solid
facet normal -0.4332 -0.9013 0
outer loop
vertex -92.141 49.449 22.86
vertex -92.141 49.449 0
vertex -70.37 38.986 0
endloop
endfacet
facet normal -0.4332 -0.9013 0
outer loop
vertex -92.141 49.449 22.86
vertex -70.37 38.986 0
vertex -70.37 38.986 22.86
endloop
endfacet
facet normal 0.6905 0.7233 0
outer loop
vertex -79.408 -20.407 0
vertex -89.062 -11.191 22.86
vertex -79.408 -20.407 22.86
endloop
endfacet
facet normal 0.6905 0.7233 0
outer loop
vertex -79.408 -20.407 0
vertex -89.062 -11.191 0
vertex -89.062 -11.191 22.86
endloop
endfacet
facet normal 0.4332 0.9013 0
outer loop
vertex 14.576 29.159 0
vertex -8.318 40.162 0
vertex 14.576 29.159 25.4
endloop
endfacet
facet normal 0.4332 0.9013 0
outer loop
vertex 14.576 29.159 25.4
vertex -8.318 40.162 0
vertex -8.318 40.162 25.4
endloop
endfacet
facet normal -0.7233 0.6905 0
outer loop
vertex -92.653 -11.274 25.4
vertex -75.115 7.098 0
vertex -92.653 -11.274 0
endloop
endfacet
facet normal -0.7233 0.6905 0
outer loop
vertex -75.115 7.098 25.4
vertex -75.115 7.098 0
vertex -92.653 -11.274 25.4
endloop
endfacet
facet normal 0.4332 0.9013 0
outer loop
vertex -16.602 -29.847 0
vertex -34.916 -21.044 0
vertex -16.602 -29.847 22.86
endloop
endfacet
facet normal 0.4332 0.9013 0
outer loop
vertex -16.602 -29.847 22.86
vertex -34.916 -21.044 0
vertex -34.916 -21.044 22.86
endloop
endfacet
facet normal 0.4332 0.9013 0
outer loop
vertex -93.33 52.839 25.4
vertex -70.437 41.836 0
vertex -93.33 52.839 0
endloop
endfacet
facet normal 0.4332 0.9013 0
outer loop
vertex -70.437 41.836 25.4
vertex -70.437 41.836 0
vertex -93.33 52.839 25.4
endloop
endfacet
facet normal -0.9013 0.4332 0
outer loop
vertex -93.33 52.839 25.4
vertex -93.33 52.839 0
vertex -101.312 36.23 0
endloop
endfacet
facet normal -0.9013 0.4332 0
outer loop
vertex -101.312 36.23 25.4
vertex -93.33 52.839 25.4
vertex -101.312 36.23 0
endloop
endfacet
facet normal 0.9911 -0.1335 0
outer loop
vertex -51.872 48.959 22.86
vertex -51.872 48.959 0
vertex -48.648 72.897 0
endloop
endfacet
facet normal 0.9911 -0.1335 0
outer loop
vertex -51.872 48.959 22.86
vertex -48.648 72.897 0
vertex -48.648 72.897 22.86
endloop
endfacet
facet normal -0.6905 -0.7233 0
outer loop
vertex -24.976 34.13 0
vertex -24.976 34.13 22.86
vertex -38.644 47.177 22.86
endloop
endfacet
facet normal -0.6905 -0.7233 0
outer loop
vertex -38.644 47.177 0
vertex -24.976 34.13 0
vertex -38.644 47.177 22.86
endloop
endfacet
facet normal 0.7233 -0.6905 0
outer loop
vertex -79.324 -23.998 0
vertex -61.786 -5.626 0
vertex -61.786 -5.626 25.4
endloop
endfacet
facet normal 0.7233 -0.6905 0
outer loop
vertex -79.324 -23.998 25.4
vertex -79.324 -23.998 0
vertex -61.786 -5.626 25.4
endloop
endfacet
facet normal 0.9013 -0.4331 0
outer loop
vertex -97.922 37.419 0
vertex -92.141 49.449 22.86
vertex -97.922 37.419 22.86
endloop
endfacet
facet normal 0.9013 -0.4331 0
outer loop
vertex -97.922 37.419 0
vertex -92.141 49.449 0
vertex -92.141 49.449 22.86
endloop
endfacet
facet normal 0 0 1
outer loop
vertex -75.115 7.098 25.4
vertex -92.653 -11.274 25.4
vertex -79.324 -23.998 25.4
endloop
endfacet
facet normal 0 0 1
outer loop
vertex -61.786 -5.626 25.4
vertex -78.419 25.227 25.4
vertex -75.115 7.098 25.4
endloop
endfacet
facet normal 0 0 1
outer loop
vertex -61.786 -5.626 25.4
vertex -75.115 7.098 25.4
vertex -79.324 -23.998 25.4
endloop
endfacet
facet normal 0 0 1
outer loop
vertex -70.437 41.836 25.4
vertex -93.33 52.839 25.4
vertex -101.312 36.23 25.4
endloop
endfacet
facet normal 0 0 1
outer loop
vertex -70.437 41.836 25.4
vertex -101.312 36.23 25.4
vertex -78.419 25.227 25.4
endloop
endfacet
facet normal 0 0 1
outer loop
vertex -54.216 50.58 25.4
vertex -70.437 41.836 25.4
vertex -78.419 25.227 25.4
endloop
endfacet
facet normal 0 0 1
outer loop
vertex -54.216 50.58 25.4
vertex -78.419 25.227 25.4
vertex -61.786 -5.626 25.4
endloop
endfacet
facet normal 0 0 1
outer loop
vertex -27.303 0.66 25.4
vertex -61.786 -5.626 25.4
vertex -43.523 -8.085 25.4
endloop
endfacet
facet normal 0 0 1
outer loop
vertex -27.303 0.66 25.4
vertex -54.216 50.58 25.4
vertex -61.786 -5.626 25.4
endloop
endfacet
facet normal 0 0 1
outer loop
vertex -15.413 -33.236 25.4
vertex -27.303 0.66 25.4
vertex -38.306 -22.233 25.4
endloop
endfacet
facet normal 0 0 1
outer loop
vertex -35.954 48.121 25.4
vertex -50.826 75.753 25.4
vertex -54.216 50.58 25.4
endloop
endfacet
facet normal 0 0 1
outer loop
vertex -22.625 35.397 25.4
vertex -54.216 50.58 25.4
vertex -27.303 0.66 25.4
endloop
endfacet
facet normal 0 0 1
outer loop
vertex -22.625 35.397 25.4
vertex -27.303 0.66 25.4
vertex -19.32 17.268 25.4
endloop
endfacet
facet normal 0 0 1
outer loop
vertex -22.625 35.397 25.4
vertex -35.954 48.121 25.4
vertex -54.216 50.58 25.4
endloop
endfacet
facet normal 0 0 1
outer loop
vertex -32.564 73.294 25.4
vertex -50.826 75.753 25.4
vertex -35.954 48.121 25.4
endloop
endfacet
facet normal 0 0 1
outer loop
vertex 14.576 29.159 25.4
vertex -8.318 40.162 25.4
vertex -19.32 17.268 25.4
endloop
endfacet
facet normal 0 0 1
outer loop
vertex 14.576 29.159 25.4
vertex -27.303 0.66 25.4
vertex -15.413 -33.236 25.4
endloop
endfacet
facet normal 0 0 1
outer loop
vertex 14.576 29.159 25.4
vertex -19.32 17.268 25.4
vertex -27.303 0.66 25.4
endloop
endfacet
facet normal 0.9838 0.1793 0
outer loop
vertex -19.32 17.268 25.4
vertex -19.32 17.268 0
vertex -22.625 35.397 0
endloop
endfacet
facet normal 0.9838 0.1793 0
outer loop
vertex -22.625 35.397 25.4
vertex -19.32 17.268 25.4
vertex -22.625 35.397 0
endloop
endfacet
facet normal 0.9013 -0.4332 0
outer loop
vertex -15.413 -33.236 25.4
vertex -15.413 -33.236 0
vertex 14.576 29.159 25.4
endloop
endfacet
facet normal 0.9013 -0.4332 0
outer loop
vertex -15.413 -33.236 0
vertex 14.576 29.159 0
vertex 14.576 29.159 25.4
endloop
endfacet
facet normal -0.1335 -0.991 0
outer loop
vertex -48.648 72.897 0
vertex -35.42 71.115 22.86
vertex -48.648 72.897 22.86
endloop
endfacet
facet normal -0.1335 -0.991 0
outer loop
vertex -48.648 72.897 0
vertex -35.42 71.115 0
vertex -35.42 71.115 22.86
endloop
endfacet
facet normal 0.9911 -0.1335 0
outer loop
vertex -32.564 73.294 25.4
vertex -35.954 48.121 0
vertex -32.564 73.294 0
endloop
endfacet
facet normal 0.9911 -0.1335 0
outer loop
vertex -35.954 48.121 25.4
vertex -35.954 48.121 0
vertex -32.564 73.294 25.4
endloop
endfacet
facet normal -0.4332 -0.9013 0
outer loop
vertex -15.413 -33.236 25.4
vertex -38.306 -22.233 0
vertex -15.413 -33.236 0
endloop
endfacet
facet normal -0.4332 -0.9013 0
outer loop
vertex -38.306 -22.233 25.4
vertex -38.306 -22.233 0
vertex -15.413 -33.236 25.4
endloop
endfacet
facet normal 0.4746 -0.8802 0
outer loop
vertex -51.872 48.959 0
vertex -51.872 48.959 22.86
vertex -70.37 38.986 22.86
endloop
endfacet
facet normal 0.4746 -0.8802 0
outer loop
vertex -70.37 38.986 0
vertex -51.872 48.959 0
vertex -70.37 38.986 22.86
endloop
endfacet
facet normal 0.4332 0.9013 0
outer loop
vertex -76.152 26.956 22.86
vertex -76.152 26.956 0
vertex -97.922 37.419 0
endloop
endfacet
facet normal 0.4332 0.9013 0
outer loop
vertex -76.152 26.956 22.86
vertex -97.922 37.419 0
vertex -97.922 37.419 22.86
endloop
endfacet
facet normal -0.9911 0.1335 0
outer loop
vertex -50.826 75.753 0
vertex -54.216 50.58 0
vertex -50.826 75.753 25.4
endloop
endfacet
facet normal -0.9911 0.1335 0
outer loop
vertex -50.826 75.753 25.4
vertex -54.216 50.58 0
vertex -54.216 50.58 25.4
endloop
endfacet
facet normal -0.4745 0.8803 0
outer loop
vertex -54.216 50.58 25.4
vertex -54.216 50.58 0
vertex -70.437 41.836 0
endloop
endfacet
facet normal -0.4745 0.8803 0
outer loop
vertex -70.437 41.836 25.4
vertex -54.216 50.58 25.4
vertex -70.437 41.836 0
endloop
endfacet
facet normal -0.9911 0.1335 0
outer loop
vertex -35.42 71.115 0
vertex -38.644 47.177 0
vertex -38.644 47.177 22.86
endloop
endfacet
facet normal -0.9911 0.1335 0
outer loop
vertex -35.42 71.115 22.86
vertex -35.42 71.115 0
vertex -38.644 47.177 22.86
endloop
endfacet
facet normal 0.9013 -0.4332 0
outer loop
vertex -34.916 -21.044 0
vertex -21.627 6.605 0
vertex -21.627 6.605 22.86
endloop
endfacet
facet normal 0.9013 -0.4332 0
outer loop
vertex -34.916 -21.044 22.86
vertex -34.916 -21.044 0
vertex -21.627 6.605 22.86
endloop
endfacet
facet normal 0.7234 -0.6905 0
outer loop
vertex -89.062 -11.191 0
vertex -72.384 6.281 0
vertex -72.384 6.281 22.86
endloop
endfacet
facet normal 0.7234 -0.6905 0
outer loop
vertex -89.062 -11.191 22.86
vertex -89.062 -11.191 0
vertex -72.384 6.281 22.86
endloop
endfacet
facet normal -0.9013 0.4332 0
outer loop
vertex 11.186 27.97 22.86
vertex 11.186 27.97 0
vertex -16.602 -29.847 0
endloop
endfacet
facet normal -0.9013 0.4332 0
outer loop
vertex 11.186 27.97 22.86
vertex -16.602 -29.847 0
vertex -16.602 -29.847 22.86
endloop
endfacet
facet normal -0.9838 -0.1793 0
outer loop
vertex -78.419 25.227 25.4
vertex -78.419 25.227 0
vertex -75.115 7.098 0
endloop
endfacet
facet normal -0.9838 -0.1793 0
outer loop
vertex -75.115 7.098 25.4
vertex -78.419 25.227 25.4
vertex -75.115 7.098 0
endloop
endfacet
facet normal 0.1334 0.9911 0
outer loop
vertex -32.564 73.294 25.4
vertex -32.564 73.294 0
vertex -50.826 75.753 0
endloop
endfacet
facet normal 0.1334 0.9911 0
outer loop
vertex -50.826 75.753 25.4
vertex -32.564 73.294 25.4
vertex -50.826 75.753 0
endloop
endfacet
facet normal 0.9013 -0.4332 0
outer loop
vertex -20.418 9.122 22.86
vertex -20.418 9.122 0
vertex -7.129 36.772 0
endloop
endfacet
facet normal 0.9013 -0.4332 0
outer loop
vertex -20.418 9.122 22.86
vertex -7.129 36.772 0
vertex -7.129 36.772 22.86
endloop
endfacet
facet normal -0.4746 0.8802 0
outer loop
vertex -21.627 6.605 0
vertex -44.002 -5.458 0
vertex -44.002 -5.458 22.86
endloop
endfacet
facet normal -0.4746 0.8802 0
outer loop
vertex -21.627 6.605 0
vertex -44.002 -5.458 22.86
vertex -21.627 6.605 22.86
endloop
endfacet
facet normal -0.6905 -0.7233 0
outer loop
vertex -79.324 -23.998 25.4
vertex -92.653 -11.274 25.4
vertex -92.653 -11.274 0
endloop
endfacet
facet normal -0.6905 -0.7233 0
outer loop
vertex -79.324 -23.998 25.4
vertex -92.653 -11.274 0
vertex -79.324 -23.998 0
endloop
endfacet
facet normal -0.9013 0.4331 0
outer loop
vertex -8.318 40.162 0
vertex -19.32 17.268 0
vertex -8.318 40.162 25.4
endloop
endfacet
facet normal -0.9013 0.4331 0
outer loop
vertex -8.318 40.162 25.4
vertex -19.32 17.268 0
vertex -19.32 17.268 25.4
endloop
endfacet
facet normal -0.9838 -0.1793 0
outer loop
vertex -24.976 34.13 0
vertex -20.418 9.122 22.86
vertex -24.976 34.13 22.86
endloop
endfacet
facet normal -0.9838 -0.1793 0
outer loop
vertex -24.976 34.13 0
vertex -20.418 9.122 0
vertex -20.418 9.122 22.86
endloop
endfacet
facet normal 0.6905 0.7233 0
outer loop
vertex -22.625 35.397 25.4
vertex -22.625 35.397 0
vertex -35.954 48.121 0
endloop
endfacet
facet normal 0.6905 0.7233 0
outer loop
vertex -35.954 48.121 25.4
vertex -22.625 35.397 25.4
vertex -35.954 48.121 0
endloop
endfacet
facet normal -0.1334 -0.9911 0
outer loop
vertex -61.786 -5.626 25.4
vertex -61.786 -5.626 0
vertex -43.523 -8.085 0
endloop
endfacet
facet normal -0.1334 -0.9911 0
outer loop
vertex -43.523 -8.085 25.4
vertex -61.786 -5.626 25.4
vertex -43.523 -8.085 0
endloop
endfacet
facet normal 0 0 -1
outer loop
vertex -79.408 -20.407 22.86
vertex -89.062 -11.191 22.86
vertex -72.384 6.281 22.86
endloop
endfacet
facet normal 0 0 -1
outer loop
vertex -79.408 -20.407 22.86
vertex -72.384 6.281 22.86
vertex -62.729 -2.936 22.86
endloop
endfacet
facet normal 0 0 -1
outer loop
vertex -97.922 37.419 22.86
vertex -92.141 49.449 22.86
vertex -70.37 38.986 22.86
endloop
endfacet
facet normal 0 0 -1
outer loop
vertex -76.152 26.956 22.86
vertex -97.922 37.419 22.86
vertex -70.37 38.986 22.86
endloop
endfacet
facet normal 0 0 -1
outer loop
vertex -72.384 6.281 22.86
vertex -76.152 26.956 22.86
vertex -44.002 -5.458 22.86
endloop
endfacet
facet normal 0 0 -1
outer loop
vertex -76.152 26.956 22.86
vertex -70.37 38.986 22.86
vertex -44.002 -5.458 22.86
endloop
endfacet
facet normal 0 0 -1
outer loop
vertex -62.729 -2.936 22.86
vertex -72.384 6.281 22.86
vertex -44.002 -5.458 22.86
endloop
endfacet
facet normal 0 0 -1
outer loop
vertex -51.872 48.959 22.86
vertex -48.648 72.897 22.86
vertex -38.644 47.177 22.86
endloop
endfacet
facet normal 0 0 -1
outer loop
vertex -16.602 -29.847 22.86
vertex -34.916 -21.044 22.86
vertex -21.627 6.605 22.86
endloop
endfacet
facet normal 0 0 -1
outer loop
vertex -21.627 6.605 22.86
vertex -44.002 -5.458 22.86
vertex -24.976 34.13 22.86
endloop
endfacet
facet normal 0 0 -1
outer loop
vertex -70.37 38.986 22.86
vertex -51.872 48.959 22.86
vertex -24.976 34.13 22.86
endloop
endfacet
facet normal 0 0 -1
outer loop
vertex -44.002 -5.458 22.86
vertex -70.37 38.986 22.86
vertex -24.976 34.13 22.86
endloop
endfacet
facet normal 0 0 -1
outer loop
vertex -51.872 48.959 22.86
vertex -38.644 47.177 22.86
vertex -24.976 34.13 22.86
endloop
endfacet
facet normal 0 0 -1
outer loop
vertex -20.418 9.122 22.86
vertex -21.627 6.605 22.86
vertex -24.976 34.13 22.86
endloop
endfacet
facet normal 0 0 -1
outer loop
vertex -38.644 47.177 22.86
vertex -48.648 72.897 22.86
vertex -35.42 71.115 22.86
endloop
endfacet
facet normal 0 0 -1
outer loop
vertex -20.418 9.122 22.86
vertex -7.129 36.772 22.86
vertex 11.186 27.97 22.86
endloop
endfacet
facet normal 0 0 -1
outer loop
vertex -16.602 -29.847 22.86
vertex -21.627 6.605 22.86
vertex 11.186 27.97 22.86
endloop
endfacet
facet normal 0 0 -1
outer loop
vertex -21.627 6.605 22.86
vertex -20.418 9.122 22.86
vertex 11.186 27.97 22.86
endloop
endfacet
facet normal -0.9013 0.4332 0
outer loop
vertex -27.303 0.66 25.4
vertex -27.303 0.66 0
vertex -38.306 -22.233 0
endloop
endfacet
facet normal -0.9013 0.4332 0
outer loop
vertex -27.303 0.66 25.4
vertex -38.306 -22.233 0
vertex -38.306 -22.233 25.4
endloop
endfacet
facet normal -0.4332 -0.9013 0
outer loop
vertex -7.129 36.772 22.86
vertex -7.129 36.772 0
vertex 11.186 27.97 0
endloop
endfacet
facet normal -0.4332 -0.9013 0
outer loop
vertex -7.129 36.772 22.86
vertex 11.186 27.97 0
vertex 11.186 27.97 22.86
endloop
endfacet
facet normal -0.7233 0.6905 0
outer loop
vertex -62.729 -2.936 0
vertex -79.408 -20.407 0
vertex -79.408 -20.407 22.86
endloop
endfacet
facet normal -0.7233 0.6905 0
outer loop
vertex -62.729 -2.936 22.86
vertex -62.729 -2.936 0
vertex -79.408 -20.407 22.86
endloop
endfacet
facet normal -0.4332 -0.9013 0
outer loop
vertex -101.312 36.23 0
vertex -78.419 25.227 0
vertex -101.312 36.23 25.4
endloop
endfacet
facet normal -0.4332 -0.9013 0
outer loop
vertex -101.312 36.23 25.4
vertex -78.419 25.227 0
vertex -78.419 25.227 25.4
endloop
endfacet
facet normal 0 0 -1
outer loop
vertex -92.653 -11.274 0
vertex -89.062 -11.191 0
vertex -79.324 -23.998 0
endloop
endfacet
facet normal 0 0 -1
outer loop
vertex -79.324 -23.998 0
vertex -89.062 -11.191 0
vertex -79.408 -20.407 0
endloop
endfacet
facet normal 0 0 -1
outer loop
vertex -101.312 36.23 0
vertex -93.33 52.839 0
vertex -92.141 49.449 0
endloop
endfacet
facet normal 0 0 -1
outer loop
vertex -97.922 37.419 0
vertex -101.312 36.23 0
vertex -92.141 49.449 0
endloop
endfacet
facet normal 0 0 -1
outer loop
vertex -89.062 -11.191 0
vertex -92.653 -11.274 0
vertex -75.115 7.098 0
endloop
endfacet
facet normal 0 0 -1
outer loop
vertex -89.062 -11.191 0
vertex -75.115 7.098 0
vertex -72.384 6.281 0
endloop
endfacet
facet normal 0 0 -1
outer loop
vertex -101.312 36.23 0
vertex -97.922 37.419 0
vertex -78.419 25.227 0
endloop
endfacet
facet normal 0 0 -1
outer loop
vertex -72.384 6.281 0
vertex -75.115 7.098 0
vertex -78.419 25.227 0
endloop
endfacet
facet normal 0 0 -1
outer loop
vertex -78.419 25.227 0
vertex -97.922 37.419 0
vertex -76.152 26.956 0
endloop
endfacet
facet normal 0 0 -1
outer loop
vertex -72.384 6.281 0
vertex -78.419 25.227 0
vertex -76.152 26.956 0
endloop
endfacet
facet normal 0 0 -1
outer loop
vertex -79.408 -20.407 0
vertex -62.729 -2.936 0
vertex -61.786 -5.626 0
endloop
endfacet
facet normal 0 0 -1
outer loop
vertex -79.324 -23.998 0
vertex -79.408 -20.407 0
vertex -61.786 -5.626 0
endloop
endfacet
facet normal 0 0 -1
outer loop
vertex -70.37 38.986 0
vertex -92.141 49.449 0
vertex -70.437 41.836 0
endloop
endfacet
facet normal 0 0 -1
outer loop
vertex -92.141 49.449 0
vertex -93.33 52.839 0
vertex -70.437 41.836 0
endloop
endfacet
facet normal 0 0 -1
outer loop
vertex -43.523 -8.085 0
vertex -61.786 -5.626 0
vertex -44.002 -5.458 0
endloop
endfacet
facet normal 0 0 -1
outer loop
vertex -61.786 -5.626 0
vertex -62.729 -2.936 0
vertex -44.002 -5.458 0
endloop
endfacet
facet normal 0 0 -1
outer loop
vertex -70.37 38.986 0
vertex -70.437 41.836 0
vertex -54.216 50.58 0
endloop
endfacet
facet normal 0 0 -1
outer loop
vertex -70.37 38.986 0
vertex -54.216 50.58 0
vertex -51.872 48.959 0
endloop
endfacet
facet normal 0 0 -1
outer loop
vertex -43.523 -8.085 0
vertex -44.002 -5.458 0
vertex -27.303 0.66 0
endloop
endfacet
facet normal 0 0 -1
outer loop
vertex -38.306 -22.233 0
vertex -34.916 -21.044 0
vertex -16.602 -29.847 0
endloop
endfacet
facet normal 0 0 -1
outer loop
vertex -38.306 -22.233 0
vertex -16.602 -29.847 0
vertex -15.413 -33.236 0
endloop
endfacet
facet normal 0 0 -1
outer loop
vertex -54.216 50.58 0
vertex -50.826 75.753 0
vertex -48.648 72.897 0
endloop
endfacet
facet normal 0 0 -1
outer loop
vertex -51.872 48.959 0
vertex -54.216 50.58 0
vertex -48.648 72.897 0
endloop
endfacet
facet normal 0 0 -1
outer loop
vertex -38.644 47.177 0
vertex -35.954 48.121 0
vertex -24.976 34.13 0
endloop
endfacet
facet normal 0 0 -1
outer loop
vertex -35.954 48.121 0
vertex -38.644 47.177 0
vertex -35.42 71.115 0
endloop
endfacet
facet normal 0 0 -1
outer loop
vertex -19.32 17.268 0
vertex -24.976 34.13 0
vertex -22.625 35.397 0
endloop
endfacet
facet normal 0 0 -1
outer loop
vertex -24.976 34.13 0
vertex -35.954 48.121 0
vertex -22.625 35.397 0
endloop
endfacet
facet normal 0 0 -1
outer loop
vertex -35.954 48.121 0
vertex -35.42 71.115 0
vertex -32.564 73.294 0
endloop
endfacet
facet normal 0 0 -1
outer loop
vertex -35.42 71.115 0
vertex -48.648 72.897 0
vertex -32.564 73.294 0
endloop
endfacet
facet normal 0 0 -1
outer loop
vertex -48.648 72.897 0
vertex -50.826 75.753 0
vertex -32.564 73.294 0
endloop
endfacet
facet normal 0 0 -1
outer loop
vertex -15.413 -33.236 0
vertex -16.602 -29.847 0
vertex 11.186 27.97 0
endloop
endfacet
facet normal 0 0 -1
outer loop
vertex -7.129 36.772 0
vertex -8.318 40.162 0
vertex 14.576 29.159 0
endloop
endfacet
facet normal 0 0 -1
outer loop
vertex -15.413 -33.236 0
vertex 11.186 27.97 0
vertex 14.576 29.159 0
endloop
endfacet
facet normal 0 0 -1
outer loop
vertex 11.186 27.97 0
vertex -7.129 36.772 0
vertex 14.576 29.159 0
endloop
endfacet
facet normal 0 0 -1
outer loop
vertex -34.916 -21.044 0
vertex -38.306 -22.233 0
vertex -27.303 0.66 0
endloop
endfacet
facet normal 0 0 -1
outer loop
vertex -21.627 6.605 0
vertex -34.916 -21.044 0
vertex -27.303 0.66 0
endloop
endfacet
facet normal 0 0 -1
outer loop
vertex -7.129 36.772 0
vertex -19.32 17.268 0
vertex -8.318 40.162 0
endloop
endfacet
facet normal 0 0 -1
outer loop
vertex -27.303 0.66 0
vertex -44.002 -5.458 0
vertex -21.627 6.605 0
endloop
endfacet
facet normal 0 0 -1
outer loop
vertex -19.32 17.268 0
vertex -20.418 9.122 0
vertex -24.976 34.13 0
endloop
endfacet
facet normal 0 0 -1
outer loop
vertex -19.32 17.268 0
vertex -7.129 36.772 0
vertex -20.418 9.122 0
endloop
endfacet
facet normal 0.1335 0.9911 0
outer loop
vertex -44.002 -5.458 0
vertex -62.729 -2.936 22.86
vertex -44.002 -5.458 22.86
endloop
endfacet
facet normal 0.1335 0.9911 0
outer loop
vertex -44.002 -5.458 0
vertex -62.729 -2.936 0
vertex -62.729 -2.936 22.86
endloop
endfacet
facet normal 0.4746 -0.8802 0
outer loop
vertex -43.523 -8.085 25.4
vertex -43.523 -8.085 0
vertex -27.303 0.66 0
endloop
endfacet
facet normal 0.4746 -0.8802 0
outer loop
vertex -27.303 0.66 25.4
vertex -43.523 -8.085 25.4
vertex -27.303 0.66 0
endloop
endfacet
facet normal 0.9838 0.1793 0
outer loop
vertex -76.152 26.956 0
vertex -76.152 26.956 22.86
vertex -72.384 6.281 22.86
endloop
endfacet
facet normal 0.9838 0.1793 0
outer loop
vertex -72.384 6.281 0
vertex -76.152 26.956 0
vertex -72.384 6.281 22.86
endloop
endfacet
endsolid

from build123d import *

# Parameters (mm, degrees)
F1_DEPTH = 25.4
F2_DEPTH = 25.4
F3_DEPTH = 25.4
F4_DEPTH = 25.4
F5_DEPTH = 25.4
F6_DEPTH = 25.4
F7_DEPTH = 25.4
F8_T     = -2.54


with BuildPart() as f1:
    # F0 (on Top) → F1 (new body)
    with BuildSketch(Plane.XY):
        Polygon((-27.3028922139, 0.6597405798), (-19.3204942288, 17.2683493668), (-22.6248939091, 35.3969319419), (-35.9539228893, 48.1209859294), (-54.216345136, 50.5803551806), (-70.4365360679, 41.8356442326), (-78.418934053, 25.2270354456), (-75.1145343727, 7.0984528704), (-61.7855053925, -5.625601117), (-43.5230831457, -8.0849703683), align=None)
    extrude(amount=F1_DEPTH)

    # F2 (add): a face of the model
    f2_faces = [f1.faces().sort_by_distance(p)[0] for p in [
        (-23.3116932213, 8.9640449733, 12.7),
    ]]
    extrude(f2_faces, amount=F2_DEPTH)

    # F3 (add): a face of the model
    f3_faces = [f1.faces().sort_by_distance(p)[0] for p in [
        (-74.4277350605, 33.5313398391, 12.7),
    ]]
    extrude(f3_faces, amount=F3_DEPTH)

    # F4 (add): a face of the model
    f4_faces = [f1.faces().sort_by_distance(p)[0] for p in [
        (-68.4500198826, 0.7364258767, 12.7),
    ]]
    extrude(f4_faces, amount=F4_DEPTH)

    # F5 (add): a face of the model
    f5_faces = [f1.faces().sort_by_distance(p)[0] for p in [
        (-45.0851340127, 49.350670555, 12.7),
    ]]
    extrude(f5_faces, amount=F5_DEPTH)

    # F6 (add): a face of the model
    f6_faces = [f1.faces().sort_by_distance(p)[0] for p in [
        (-7.8739129687, 11.7669152395, 12.7),
    ]]
    extrude(f6_faces, amount=F6_DEPTH)

    # F7 (add): a face of the model
    f7_faces = [f1.faces().sort_by_distance(p)[0] for p in [
        (-15.8563109538, -4.8416935475, 12.7),
    ]]
    extrude(f7_faces, amount=F7_DEPTH)

    # F8
    f8_openings = [f1.faces().sort_by_distance(p)[0] for p in [
        (-42.455515, 18.164912, 0),
    ]]
    offset(amount=F8_T, openings=f8_openings, kind=Kind.INTERSECTION)


solid = f1.part
